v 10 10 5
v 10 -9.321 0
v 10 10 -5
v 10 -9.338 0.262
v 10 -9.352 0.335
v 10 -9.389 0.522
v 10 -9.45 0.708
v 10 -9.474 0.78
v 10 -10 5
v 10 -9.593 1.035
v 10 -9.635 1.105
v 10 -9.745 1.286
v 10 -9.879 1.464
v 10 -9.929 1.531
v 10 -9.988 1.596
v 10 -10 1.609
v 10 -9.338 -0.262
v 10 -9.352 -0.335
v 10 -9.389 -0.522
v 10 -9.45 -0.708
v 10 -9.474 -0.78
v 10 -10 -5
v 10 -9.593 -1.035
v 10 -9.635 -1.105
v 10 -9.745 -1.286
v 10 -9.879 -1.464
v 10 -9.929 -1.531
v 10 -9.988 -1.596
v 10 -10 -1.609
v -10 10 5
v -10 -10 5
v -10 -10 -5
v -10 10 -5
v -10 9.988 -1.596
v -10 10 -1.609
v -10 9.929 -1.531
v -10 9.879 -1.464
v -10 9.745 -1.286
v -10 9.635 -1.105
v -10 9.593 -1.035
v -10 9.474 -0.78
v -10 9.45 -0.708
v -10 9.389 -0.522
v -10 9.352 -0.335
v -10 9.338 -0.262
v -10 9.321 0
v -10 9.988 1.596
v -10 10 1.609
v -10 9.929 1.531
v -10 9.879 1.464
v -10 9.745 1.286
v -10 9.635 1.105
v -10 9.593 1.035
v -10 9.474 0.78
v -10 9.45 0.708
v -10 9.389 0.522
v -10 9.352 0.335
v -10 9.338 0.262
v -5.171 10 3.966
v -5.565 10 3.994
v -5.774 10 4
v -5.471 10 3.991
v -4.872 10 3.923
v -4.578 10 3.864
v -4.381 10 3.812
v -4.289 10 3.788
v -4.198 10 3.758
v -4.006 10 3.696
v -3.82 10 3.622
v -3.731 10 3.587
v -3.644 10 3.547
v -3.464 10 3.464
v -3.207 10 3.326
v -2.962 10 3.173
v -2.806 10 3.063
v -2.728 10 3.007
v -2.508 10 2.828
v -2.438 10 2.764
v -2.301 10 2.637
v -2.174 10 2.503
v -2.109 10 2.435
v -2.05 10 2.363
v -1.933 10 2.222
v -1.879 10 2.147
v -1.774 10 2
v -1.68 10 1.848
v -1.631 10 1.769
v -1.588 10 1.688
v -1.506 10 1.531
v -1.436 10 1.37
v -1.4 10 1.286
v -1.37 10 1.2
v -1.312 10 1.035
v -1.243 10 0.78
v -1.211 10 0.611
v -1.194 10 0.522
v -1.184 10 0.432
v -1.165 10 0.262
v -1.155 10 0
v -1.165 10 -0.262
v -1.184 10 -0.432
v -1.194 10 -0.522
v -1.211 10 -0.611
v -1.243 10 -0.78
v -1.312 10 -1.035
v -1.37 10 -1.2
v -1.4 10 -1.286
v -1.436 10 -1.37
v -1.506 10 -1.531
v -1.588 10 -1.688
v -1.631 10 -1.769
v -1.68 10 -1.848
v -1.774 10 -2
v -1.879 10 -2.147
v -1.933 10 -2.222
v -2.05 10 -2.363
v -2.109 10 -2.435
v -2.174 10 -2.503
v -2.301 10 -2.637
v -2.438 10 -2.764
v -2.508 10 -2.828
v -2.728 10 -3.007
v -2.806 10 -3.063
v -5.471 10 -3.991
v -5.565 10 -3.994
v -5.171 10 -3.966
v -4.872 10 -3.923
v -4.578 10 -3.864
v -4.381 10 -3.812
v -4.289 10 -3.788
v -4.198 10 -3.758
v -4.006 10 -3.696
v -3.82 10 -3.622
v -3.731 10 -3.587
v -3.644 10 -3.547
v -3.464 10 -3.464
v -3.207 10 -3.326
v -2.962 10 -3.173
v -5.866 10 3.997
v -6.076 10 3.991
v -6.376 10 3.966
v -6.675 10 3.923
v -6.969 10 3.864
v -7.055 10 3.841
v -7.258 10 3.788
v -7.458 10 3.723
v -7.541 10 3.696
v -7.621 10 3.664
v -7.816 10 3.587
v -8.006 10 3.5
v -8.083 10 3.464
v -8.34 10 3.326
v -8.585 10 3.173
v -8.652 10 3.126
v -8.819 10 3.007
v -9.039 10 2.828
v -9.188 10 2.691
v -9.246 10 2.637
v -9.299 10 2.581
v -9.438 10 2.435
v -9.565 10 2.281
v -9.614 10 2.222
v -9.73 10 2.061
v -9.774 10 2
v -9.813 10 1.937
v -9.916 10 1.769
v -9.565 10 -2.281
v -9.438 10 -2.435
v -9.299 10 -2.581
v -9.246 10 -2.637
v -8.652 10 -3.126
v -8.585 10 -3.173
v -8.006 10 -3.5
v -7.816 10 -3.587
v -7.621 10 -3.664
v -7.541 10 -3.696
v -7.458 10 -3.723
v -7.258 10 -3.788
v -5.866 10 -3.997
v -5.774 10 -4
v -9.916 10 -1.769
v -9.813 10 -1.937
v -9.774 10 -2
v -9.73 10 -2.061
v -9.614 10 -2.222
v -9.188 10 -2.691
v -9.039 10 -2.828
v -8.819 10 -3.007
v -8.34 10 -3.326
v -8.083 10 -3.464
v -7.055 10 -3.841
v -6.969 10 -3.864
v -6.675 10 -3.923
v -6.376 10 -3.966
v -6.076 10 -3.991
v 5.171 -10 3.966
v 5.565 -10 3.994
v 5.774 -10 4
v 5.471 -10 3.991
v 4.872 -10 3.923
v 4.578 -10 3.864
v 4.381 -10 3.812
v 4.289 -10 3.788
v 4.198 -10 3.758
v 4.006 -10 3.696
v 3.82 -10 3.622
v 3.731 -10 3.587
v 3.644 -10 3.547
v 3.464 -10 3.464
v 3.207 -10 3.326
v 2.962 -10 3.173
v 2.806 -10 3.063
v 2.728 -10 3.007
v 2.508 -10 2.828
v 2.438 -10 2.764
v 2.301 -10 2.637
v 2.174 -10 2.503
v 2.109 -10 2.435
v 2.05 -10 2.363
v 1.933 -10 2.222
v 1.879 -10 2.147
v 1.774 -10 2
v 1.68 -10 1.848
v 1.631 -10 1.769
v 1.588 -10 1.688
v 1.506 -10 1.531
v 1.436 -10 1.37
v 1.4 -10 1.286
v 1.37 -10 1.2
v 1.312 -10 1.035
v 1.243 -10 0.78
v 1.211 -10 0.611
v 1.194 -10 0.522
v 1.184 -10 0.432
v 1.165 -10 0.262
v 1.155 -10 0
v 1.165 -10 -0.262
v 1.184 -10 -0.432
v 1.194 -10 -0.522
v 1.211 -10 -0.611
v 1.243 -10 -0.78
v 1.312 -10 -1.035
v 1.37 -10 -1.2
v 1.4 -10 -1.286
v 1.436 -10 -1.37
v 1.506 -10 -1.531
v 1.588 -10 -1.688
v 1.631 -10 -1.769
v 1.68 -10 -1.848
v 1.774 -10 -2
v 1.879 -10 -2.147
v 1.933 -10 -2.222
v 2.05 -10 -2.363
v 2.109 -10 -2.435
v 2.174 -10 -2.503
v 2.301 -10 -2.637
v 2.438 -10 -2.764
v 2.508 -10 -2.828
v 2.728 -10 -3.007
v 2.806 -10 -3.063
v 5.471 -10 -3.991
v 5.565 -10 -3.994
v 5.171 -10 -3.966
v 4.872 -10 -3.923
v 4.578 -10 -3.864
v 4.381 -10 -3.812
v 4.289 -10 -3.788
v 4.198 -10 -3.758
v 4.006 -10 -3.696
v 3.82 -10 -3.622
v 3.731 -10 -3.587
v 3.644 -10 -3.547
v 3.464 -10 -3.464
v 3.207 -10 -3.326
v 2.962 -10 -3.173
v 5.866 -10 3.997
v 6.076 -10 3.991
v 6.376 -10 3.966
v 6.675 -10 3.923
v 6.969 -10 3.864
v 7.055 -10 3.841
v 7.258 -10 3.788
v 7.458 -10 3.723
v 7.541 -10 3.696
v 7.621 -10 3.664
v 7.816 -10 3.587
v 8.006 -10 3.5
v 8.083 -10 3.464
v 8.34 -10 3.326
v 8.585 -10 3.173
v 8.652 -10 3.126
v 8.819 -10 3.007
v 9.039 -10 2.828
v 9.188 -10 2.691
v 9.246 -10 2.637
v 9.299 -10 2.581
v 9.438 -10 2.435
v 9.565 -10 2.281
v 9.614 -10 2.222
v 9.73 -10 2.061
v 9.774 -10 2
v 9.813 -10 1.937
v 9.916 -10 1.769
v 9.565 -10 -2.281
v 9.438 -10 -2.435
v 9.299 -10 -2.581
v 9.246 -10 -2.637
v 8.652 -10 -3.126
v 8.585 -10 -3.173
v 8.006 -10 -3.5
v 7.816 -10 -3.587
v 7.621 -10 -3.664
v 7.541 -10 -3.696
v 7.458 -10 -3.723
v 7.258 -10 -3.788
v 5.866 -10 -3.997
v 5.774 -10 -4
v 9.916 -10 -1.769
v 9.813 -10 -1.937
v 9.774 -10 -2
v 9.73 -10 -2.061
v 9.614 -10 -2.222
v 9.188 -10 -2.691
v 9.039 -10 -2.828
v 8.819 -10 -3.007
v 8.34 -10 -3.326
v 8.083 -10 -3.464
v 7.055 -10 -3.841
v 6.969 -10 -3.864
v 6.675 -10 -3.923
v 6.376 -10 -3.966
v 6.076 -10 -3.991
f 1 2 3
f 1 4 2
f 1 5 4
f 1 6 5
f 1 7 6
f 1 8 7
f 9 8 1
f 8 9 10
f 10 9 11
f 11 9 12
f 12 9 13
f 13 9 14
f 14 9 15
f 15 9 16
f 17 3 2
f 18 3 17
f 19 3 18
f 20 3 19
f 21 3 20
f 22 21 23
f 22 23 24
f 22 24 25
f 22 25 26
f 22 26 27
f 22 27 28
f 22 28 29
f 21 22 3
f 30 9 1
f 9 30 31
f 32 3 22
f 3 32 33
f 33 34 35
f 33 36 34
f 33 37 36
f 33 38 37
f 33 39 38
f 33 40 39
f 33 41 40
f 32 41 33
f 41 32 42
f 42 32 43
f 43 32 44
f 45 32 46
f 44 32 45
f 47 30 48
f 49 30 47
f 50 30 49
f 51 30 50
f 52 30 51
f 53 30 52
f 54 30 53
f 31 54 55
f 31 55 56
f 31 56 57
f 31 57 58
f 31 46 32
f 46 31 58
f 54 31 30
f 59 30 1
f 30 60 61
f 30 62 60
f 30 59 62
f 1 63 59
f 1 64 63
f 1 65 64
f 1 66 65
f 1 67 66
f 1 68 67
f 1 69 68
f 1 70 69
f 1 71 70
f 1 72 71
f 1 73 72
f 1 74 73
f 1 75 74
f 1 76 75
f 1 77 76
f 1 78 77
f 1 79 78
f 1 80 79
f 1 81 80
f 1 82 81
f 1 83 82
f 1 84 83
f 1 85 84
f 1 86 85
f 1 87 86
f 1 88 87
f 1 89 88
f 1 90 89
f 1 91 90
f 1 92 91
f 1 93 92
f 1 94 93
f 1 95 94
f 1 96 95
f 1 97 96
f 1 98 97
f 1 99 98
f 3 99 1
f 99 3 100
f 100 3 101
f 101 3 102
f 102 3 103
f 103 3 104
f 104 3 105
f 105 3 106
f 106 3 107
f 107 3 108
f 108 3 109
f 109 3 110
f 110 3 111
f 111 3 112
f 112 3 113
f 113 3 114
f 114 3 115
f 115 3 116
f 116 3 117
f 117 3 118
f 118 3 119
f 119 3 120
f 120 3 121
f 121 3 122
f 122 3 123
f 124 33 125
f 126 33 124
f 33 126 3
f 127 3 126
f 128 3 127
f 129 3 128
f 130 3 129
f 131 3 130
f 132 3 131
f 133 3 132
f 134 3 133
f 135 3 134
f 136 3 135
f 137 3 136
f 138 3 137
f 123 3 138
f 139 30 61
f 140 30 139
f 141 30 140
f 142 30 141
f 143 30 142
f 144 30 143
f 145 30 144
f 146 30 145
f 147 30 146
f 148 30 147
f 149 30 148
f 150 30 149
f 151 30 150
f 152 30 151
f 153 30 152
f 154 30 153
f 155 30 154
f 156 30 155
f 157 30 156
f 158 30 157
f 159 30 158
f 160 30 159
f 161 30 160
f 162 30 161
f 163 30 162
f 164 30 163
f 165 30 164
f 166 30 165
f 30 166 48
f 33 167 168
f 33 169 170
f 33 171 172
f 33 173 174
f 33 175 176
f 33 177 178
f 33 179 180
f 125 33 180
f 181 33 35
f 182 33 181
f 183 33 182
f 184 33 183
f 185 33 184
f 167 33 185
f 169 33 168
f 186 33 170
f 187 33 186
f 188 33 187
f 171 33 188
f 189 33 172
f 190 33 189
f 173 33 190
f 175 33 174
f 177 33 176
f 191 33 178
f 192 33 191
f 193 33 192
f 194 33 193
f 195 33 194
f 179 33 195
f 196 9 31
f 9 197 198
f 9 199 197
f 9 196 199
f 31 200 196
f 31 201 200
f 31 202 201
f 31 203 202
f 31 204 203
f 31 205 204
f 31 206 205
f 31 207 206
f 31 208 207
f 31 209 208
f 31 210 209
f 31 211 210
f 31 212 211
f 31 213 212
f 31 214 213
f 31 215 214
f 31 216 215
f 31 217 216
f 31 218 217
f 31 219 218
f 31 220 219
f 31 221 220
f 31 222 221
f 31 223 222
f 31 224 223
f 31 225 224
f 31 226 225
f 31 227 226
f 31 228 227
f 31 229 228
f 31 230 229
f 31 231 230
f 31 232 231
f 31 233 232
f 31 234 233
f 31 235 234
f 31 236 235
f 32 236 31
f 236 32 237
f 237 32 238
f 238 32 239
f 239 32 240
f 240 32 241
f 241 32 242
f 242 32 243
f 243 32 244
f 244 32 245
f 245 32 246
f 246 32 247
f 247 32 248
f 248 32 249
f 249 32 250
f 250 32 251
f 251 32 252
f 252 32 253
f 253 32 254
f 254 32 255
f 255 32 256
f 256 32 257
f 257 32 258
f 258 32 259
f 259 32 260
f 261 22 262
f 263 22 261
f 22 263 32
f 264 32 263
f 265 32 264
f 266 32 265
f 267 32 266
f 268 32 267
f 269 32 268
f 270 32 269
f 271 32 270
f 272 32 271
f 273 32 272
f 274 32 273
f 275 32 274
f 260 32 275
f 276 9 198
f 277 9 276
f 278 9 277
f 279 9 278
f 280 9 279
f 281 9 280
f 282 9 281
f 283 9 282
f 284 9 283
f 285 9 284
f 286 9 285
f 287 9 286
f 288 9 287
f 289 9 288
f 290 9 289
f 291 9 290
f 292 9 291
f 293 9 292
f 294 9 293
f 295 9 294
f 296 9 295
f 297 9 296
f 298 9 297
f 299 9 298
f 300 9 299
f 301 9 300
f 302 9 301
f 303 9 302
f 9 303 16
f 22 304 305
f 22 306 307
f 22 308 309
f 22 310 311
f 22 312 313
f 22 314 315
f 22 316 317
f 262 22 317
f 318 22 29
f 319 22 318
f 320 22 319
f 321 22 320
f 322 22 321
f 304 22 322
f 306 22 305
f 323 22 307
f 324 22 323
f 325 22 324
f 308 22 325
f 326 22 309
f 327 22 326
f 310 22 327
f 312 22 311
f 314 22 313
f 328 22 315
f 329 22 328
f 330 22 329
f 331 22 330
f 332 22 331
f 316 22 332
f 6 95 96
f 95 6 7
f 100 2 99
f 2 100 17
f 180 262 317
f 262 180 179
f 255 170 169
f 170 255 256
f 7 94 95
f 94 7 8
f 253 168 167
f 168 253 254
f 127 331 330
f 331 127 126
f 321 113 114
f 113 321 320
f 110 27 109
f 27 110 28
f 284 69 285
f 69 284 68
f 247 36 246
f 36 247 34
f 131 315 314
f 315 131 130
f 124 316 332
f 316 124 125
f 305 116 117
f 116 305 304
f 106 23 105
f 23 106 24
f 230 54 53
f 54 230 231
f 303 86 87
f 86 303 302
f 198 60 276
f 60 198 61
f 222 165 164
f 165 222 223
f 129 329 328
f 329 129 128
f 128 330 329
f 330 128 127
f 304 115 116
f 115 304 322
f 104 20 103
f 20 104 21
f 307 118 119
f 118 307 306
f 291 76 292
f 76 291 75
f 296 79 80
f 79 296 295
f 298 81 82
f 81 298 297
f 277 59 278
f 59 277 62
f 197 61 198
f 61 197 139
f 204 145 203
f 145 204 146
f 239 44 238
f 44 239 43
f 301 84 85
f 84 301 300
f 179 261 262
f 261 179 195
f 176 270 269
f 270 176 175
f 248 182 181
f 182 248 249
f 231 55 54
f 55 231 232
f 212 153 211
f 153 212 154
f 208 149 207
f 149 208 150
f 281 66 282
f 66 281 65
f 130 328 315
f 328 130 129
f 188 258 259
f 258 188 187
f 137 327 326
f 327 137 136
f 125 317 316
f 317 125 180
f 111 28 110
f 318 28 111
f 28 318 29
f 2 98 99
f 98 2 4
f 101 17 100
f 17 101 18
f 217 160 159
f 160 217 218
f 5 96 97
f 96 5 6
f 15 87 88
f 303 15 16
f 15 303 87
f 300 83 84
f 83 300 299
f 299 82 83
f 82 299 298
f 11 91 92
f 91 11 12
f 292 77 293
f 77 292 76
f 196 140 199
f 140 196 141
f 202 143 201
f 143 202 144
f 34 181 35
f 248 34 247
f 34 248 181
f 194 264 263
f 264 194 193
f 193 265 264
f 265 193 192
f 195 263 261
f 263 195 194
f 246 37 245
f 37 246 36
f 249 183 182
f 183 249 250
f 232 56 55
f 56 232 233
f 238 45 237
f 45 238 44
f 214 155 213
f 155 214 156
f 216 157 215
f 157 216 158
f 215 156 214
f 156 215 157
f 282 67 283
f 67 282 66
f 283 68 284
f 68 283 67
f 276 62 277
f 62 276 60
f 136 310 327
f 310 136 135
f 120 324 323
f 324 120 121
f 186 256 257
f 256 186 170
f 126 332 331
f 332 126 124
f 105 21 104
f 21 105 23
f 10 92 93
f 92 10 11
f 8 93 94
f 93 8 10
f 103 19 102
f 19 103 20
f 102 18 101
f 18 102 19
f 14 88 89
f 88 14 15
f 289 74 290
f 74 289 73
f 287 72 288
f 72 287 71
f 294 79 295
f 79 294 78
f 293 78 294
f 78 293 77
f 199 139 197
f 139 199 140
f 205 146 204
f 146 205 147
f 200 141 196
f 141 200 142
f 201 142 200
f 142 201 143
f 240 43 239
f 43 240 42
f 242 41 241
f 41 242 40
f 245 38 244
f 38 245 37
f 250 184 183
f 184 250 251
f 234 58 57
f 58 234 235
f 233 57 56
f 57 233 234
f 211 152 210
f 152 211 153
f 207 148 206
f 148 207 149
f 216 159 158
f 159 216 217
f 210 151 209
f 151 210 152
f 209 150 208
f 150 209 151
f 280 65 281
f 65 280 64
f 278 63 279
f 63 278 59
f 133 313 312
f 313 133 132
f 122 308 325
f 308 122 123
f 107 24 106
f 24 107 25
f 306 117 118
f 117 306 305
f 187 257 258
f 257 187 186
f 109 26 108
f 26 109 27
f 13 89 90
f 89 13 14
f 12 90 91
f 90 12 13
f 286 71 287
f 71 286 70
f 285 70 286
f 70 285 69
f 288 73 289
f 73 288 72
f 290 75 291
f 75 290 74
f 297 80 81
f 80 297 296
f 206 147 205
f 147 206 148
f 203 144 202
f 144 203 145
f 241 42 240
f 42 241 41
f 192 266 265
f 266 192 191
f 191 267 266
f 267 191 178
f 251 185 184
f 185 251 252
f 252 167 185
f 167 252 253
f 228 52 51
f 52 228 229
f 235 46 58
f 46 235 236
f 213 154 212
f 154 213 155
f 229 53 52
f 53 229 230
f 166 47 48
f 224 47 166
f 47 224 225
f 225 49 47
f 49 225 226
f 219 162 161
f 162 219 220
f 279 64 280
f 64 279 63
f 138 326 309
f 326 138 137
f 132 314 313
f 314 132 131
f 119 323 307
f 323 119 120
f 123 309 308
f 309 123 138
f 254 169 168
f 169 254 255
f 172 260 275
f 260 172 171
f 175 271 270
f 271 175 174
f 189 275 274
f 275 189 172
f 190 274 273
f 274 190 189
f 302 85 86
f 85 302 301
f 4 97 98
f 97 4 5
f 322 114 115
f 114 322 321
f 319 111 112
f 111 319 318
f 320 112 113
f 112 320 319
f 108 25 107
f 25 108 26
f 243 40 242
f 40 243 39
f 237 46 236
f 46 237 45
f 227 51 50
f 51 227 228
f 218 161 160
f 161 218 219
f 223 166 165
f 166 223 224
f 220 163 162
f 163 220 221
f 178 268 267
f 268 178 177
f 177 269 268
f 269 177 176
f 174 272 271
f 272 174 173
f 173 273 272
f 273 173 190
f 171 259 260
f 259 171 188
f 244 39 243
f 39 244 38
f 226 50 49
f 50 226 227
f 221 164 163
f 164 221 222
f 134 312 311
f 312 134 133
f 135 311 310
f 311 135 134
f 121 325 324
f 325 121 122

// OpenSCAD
// 03 斜孔 —— Ø8 通孔，轴线与 y 轴成 30°
//
// 真值：通道瓶颈半径 = 4.000mm。
//
// 用途：证明"通道轴"与"零件坐标轴"不重合**不构成问题**：
//       斜切一个棱柱通道得到的是拉长的椭圆/矩形，它的最大内切圆半径
//       仍等于正切时的半径。所以"换不同角度切"在棱柱通道上买不到任何东西。
$fn = 96;
difference() {
  cube([20, 20, 10], center = true);
  rotate([0, 0, 30]) rotate([-90, 0, 0]) cylinder(r = 4, h = 60, center = true);
}
